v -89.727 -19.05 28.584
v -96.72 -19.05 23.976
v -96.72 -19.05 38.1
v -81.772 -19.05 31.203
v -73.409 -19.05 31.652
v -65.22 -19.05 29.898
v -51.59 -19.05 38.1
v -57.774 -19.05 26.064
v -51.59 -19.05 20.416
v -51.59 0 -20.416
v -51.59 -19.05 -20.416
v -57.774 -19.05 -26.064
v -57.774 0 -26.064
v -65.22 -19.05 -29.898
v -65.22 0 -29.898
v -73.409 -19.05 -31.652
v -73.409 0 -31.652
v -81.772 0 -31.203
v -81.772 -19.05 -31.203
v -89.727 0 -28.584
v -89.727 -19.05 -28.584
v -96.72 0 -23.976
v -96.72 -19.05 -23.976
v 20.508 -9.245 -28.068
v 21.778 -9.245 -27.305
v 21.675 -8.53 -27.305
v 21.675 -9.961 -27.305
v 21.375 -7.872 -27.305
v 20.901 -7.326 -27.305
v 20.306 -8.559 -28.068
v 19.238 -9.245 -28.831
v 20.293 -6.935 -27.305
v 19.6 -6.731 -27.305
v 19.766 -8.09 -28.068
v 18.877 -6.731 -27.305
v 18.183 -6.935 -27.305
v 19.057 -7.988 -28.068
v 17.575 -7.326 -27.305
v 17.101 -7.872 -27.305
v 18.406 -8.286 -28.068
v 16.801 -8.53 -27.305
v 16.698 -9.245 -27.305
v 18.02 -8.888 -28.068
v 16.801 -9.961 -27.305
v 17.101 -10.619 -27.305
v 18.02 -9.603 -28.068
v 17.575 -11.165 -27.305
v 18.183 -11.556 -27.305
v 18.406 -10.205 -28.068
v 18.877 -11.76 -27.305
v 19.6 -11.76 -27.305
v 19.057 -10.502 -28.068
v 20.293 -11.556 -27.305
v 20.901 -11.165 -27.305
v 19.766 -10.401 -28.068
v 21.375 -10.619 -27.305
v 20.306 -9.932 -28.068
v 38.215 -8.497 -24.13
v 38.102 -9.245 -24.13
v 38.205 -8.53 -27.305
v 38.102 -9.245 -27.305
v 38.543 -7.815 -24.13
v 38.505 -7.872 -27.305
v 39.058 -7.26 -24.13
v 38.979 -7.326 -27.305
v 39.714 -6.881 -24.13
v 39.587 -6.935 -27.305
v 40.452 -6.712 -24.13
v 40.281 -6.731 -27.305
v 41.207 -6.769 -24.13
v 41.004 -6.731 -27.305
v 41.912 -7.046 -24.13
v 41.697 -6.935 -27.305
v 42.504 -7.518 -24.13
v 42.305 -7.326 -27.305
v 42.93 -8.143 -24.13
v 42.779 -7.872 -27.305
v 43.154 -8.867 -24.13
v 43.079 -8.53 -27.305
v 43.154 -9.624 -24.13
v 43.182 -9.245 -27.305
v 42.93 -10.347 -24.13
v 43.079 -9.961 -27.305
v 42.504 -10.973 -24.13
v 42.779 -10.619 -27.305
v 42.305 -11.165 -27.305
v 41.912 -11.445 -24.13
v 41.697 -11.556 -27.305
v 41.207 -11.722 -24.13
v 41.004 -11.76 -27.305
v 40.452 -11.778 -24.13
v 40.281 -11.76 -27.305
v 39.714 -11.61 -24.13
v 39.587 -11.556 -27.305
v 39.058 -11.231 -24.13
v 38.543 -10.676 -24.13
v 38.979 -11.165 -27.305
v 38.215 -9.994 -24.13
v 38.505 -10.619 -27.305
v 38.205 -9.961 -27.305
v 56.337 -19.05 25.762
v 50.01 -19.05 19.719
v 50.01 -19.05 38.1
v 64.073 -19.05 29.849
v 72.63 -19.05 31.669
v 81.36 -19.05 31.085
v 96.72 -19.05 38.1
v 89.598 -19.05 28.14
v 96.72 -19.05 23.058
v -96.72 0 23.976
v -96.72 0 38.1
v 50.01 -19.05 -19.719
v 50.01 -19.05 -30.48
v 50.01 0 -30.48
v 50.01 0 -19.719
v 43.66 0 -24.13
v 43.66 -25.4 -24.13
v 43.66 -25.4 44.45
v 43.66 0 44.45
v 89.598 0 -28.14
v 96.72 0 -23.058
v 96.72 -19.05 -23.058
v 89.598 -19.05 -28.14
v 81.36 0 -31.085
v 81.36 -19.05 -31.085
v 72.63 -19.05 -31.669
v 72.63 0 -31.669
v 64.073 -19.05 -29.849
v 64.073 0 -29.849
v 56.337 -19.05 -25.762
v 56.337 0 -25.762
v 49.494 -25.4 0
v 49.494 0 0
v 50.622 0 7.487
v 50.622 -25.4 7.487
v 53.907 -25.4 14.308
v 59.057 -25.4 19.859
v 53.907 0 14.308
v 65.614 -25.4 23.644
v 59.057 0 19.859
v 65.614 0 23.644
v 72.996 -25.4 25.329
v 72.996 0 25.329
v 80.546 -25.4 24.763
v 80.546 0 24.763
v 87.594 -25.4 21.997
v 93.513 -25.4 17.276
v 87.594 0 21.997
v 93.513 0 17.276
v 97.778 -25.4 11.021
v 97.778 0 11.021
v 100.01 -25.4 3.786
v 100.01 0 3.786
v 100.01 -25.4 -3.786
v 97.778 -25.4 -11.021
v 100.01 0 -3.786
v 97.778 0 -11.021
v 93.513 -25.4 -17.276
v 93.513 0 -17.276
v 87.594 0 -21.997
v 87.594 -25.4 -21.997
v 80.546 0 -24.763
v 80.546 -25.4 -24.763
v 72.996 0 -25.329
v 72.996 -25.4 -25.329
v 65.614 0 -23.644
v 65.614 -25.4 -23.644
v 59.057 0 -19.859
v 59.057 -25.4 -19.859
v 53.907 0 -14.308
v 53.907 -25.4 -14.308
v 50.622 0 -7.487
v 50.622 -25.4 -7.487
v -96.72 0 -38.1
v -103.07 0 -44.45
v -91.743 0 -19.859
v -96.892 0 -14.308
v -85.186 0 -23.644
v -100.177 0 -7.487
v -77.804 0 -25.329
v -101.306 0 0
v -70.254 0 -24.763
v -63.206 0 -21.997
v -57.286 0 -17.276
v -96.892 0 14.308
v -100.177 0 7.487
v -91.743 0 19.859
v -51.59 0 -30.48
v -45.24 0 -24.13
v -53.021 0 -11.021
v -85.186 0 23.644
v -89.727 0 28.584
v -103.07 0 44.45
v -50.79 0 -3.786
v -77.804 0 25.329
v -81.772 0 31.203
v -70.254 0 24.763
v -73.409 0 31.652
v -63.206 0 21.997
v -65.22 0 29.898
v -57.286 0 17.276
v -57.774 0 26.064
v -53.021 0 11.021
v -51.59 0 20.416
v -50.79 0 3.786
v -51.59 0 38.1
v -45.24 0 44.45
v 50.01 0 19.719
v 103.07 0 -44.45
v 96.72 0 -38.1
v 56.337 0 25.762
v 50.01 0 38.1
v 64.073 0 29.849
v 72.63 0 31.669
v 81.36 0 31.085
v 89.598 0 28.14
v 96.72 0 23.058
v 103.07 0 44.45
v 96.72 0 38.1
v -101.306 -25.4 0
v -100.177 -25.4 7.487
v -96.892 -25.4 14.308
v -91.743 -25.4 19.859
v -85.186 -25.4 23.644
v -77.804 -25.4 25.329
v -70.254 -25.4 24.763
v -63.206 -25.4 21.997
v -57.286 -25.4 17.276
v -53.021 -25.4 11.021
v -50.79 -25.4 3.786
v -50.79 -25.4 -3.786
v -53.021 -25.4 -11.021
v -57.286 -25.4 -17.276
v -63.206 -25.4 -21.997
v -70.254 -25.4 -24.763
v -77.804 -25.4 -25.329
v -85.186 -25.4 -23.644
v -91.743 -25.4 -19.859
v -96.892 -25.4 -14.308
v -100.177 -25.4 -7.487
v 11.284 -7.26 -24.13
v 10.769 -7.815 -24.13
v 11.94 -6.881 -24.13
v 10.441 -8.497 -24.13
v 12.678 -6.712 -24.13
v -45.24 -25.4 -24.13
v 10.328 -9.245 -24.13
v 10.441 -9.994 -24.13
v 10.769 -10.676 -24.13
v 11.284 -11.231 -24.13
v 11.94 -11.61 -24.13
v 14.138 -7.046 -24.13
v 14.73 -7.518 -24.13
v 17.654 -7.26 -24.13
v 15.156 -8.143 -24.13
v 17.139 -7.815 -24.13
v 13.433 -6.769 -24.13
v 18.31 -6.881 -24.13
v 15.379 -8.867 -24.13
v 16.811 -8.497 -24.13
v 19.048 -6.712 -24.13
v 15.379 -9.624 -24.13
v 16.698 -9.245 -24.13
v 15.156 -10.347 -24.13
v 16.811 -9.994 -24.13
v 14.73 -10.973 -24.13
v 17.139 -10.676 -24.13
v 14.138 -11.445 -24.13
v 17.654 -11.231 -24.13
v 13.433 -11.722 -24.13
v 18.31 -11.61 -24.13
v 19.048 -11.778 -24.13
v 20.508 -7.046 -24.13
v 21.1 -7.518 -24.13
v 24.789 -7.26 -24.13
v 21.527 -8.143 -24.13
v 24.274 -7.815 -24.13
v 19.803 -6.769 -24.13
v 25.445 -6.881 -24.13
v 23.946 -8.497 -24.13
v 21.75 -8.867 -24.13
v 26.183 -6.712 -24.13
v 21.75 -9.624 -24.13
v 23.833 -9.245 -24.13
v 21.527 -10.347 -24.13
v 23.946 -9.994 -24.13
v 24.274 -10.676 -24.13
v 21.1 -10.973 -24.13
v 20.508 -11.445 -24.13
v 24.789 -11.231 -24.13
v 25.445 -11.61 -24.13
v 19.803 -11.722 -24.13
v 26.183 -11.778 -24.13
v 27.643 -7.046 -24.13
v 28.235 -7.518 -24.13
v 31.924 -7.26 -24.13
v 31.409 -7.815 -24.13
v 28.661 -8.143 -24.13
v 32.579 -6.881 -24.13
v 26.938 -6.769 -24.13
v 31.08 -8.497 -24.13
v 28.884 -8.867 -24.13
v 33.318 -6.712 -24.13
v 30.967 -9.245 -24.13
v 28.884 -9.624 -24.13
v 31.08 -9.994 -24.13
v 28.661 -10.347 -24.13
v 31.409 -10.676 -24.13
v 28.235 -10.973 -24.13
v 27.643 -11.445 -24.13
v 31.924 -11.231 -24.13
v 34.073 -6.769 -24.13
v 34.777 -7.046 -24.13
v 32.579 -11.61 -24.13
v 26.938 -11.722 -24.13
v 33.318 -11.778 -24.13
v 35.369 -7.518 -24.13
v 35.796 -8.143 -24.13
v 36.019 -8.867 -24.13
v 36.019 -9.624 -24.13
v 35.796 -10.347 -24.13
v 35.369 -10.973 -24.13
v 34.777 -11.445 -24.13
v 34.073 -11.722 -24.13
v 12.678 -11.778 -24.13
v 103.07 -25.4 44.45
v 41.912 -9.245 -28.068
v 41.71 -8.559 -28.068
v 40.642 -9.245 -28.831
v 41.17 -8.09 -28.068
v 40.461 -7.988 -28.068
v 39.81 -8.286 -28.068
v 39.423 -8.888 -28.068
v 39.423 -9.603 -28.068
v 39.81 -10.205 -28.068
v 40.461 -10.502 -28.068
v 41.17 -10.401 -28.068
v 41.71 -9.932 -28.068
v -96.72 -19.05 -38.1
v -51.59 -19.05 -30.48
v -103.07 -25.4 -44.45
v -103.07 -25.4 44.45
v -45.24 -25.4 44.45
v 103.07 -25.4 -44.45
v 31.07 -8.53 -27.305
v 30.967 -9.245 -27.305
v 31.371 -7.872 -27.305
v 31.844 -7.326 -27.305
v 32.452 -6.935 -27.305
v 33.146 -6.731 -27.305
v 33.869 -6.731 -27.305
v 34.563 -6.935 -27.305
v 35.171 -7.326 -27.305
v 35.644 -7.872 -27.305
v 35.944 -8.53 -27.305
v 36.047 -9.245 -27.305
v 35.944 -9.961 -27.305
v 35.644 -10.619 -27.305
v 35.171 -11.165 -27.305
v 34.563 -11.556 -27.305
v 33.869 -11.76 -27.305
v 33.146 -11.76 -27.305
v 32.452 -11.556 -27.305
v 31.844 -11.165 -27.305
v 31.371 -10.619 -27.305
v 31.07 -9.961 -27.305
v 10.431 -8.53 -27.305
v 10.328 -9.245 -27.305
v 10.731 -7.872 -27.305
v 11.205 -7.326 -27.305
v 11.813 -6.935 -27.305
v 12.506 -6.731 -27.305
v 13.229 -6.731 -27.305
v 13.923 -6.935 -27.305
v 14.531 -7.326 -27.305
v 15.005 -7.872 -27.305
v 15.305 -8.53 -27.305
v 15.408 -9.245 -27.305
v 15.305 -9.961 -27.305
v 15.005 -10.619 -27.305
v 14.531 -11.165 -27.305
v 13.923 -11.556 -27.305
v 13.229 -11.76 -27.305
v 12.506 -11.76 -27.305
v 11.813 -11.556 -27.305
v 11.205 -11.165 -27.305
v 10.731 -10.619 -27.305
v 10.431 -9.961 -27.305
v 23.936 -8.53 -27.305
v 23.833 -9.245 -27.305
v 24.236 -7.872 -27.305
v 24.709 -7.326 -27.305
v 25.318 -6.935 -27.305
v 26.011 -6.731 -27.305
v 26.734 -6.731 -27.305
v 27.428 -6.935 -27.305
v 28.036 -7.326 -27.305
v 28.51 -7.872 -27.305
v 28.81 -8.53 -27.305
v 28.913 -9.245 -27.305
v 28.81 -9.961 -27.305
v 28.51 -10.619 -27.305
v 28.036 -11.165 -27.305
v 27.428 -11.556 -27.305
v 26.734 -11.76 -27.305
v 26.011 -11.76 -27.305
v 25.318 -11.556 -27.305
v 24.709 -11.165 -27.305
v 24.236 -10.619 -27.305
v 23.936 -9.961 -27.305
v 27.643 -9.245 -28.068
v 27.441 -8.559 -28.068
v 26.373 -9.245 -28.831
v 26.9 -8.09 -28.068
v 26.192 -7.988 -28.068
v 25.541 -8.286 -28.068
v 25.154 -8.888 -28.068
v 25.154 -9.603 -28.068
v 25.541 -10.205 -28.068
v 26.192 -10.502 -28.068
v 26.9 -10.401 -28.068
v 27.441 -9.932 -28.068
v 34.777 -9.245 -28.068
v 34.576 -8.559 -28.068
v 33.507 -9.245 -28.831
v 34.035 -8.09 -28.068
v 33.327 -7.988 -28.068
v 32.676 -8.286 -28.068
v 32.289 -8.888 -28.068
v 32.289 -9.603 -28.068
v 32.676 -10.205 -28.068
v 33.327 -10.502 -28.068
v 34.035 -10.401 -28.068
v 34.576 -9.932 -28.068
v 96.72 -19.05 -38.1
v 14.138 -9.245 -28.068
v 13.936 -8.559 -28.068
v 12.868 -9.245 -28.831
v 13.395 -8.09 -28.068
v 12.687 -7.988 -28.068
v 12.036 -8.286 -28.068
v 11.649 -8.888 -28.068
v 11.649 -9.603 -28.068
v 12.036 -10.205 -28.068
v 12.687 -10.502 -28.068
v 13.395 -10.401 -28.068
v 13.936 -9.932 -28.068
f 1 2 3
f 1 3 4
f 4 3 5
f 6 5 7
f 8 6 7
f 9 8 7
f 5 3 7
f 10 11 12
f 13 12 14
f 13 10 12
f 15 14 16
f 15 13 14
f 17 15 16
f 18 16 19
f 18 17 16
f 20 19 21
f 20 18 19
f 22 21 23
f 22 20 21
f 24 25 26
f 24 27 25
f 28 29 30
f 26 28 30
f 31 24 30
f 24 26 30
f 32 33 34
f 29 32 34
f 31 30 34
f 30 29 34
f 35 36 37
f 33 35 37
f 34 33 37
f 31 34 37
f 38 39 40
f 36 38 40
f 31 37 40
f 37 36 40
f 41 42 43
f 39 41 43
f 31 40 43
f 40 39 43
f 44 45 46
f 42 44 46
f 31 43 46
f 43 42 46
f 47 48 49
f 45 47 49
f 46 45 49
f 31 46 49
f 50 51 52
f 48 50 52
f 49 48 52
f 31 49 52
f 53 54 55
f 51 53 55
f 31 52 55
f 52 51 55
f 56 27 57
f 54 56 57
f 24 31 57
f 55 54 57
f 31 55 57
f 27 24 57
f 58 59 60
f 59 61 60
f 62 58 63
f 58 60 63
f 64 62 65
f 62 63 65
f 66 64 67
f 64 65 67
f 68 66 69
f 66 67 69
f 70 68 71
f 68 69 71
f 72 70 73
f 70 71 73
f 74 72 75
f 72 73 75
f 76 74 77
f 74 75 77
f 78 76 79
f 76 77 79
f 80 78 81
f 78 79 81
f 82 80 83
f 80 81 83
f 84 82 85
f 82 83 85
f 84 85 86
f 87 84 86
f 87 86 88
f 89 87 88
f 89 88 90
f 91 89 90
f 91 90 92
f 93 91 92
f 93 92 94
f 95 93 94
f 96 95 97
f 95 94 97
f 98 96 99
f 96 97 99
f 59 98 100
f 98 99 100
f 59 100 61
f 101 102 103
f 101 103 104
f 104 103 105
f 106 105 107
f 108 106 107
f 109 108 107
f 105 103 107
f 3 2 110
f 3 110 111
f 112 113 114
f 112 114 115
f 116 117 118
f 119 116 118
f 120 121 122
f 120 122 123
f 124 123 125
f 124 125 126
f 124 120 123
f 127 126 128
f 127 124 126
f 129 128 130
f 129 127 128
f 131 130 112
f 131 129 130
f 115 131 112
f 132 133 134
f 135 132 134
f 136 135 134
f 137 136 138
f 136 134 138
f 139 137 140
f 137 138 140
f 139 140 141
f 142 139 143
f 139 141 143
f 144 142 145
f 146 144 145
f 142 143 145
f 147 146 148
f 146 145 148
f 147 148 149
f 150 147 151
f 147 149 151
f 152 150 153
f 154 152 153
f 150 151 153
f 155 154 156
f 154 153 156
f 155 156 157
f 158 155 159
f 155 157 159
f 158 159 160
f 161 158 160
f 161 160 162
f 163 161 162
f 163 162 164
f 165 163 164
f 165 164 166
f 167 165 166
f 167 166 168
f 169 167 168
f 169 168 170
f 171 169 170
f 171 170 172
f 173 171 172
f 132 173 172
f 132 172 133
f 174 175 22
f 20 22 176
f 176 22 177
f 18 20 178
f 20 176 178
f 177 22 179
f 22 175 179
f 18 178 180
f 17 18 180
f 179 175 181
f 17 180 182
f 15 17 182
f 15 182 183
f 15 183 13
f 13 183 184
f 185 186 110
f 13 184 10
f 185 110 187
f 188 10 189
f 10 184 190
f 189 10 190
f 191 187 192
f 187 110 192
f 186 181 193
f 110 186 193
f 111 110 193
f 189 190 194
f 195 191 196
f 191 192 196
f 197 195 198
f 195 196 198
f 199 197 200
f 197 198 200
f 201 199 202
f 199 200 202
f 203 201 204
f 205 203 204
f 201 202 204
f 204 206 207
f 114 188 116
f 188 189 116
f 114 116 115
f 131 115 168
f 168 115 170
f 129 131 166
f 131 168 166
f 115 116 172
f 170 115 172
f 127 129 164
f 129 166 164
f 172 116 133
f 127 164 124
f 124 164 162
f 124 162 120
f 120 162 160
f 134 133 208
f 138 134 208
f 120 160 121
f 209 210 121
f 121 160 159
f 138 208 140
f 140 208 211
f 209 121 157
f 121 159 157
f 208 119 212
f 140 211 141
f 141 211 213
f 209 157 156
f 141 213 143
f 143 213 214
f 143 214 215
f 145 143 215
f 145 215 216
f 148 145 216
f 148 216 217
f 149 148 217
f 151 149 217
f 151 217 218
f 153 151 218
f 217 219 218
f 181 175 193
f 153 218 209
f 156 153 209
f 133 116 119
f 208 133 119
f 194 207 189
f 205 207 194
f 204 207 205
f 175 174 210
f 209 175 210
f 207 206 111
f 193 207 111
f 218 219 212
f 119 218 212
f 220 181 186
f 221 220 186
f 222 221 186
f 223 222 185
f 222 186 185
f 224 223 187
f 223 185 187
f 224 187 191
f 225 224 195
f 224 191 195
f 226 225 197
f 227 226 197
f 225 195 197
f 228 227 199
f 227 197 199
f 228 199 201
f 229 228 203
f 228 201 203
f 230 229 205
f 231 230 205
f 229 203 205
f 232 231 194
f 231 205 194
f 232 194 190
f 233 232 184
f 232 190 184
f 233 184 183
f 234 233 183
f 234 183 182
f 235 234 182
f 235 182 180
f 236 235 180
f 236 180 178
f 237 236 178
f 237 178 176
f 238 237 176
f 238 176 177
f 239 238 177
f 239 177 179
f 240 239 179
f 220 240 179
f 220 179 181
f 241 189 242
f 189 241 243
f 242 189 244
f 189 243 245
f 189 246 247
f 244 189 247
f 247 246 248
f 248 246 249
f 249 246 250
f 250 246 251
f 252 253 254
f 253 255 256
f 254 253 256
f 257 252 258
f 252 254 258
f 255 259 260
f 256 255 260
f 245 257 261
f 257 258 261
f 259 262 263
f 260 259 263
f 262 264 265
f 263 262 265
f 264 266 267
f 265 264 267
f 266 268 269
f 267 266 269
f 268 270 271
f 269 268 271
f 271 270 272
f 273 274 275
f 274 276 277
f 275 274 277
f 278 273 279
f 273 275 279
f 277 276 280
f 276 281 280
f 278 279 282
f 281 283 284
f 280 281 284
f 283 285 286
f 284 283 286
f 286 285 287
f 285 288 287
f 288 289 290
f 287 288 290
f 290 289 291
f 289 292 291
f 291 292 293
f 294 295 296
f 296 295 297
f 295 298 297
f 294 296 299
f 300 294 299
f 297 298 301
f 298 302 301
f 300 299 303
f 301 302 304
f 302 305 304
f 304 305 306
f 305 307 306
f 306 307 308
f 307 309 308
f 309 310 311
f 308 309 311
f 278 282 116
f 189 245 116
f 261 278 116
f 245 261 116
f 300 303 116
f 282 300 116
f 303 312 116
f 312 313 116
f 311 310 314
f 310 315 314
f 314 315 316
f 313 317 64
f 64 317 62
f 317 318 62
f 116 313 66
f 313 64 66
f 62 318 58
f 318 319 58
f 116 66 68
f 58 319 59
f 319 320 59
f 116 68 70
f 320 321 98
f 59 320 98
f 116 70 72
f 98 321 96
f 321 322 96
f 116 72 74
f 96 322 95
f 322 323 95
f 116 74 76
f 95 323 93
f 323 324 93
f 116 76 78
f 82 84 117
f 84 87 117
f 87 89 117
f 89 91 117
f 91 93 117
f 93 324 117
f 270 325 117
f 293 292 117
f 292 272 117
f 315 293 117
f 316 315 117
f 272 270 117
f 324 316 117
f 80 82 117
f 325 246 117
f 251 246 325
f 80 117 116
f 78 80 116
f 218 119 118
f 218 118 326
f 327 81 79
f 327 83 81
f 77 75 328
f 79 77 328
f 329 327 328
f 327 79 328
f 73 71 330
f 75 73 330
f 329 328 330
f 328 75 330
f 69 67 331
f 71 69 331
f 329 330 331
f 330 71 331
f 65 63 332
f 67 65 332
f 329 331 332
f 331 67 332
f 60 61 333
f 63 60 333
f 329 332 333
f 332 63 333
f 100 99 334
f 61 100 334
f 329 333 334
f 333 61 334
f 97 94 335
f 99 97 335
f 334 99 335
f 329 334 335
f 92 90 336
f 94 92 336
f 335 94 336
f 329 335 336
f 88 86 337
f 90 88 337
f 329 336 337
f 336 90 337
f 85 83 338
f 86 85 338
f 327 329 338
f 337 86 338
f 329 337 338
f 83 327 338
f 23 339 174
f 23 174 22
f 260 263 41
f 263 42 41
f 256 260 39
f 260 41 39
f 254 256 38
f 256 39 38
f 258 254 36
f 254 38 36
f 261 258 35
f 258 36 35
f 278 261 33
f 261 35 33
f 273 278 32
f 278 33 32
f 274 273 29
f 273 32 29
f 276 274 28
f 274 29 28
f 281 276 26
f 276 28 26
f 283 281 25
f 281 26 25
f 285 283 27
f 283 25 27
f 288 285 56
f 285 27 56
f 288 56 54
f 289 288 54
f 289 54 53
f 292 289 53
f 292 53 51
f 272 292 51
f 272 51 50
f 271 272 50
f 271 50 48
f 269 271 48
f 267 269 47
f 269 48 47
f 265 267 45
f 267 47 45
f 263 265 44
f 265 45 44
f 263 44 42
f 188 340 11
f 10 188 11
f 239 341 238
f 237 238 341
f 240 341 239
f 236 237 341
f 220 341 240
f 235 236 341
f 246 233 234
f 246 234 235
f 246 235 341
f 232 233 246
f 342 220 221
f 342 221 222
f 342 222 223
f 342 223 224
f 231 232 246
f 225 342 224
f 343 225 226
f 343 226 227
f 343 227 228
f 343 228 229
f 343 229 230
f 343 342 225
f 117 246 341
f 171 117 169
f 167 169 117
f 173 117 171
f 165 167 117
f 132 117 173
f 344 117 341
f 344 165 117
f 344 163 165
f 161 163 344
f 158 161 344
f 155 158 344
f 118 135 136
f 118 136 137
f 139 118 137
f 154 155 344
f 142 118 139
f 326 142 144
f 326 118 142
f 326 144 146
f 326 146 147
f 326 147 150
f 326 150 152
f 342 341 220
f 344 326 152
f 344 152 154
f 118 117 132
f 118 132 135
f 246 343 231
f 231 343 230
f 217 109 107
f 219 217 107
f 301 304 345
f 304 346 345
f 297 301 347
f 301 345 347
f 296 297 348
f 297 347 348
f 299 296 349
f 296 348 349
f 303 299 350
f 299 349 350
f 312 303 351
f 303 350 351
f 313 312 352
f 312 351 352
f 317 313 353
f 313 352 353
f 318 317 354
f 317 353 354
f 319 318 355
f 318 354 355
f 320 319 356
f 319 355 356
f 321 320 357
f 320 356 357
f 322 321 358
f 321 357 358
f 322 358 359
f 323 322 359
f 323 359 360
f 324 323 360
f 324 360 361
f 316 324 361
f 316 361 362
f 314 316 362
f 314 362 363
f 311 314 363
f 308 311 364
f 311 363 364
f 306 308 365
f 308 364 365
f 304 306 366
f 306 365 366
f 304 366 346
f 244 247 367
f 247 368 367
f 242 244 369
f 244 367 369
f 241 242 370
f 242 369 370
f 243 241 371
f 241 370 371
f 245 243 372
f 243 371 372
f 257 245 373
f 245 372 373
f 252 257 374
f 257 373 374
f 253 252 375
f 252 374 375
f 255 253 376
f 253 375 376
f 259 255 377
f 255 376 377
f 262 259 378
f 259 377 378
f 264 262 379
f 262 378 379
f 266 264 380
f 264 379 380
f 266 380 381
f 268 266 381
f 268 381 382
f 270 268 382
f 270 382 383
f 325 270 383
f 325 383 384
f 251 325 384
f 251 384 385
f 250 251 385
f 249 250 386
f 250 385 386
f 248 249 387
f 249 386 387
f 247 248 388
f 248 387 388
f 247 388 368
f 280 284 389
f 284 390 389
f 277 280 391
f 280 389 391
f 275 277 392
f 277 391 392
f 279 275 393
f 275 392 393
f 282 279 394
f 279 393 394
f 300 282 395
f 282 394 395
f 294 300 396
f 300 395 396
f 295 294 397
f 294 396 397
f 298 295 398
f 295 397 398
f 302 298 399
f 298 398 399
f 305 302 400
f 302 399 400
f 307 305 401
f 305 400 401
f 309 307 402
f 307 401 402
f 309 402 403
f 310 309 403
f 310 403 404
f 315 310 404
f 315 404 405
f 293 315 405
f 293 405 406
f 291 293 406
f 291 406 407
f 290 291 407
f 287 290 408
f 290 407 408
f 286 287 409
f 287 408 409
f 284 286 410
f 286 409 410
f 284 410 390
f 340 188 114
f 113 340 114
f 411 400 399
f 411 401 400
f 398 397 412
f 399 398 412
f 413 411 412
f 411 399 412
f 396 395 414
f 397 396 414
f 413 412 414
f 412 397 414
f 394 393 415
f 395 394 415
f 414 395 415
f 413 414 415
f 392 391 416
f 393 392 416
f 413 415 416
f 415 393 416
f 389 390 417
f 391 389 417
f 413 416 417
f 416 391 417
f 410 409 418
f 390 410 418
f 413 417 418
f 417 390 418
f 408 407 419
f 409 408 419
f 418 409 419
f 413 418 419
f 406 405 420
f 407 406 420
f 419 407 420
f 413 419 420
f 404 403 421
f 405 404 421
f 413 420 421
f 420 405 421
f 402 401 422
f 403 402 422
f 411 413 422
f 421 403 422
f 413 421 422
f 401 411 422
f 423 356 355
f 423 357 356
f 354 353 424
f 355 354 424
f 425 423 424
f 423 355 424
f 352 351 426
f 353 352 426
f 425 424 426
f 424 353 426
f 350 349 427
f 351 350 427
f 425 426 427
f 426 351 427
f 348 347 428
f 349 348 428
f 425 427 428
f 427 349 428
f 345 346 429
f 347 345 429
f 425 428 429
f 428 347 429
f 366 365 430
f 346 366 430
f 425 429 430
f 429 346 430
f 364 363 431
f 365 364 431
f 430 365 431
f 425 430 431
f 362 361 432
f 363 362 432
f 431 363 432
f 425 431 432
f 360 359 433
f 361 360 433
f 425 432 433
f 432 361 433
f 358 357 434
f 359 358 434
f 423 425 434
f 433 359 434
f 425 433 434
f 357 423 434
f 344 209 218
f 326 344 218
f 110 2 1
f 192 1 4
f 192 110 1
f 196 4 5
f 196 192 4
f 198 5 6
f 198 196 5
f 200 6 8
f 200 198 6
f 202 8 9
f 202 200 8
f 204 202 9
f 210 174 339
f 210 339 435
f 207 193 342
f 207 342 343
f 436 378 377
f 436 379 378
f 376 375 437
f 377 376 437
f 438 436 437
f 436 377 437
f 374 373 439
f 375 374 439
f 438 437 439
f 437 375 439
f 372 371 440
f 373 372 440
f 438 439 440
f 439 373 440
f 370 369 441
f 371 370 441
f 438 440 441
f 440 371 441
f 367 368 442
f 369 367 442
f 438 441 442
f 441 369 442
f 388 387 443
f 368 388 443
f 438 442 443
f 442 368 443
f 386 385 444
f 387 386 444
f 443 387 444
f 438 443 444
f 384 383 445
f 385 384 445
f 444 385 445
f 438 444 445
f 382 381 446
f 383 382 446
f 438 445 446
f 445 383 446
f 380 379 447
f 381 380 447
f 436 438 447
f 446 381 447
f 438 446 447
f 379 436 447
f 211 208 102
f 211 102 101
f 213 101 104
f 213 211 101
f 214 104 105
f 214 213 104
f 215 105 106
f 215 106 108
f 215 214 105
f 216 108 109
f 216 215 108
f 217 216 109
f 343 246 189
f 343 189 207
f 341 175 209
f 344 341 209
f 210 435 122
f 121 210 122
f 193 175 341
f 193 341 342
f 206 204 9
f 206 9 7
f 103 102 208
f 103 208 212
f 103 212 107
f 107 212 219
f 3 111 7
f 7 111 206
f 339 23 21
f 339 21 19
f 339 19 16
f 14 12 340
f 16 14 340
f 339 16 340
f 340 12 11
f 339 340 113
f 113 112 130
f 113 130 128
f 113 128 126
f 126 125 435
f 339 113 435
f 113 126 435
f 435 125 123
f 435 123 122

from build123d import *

# Parameters (mm, degrees)
F0_W        = 206.1404287815
F0_H        = 88.9
F1_DEPTH    = 25.4
F4_D        = 50.8
F4_ON_F3_D  = 50.8
F5_W        = 88.9
F5_H        = 68.58
F6_DEPTH    = 25.401
F7_T        = 6.35
F7_T3_DEPTH = 38.1
F9_D        = 5.08
F9_DEPTH    = 3.175
F9_TIP      = 1.5261859723


# Not quite as in the source:
# - a shell that OpenCascade refuses in one call is made with other operations: the cavity is built on its own and cut out


with BuildPart() as f1:
    # F0 (on Front) → F1 (new body)
    with BuildSketch(Plane.XZ):
        Rectangle(F0_W, F0_H)
    extrude(amount=F1_DEPTH)

    # F4 (through all)
    with Locations(Plane.XZ.offset(25.4)):
        with Locations((-75.905919075, 0)):
            Hole(F4_D / 2)

    # F4 on F3 (through all)
    with Locations(Plane.XZ.offset(25.4)):
        with Locations((74.8937055469, 0)):
            Hole(F4_ON_F3_D / 2)

    # F5 (on face) → F6 (cut, through all)
    with BuildSketch(Plane.XZ.offset(25.4)):
        with Locations((-0.7901638031, 10.16)):
            Rectangle(F5_W, F5_H)
    extrude(amount=-F6_DEPTH, mode=Mode.SUBTRACT)

    # F7: shell of thickness 6.35, made by hand


with BuildPart() as f7_core1:
    # F7_t2: copy of F1
    add(f1.part)

    # the walls: a layer under each face that stays
    f7_faces = [f7_core1.faces().sort_by_distance(p)[0] for p in [
        (0, -12.7, -44.45),
        (-103.0702143908, -12.7, 0),
        (103.0702143908, -12.7, 0),
        (-68.7134762605, -25.4, -29.6333333333),
        (-74.1551890969, -12.7, 44.45),
        (73.3650252938, -12.7, 44.45),
        (-45.2401638031, -12.7, 10.16),
        (-0.7901638031, -12.7, -24.13),
        (43.6598361969, -12.7, 10.16),
        (-101.305919075, -12.7, 0),
        (49.4937055469, -12.7, 0),
    ]]
    thicken(f7_faces, amount=-F7_T, mode=Mode.SUBTRACT)

    # F7_s4 → F7_t3 (cut)
    with BuildSketch(Plane.XZ.offset(-6.35)):
        Polygon((-45.1766638031, -24.0665), (-51.5901638031, -24.13), (-51.5901638031, -30.48), (-45.2401638031, -30.48), align=None)
        Polygon((43.5963361969, -24.0665), (43.6598361969, -30.48), (50.0098361969, -30.48), (50.0098361969, -24.13), align=None)
    extrude(amount=F7_T3_DEPTH, mode=Mode.SUBTRACT)


with BuildPart() as f1_1:
    add(f1.part)

    # what is left inside the walls is the cavity
    f7_cavity = [f7_core1.part.solids().sort_by_distance(p)[0] for p in [
        (0, -12.7, -38.0365),
        (-73.404336, -6.35, 31.714994),
        (72.62573, -6.35, 31.732555),
    ]]
    add(f7_cavity, mode=Mode.SUBTRACT)

    # F9
    with Locations(Plane.XY.offset(-24.13)):
        with Locations((40.6420230865, -9.2453807592), (33.507373184, -9.2453807592), (26.3727232814, -9.2453807592), (19.2380733788, -9.2453807592), (12.8678502515, -9.2453807592)):
            Hole(F9_D / 2, depth=F9_DEPTH)
            with Locations((0, 0, -(F9_DEPTH + F9_TIP / 2))):  # 118° drill point
                Cone(0, F9_D / 2, F9_TIP, mode=Mode.SUBTRACT)


solid = f1_1.part
